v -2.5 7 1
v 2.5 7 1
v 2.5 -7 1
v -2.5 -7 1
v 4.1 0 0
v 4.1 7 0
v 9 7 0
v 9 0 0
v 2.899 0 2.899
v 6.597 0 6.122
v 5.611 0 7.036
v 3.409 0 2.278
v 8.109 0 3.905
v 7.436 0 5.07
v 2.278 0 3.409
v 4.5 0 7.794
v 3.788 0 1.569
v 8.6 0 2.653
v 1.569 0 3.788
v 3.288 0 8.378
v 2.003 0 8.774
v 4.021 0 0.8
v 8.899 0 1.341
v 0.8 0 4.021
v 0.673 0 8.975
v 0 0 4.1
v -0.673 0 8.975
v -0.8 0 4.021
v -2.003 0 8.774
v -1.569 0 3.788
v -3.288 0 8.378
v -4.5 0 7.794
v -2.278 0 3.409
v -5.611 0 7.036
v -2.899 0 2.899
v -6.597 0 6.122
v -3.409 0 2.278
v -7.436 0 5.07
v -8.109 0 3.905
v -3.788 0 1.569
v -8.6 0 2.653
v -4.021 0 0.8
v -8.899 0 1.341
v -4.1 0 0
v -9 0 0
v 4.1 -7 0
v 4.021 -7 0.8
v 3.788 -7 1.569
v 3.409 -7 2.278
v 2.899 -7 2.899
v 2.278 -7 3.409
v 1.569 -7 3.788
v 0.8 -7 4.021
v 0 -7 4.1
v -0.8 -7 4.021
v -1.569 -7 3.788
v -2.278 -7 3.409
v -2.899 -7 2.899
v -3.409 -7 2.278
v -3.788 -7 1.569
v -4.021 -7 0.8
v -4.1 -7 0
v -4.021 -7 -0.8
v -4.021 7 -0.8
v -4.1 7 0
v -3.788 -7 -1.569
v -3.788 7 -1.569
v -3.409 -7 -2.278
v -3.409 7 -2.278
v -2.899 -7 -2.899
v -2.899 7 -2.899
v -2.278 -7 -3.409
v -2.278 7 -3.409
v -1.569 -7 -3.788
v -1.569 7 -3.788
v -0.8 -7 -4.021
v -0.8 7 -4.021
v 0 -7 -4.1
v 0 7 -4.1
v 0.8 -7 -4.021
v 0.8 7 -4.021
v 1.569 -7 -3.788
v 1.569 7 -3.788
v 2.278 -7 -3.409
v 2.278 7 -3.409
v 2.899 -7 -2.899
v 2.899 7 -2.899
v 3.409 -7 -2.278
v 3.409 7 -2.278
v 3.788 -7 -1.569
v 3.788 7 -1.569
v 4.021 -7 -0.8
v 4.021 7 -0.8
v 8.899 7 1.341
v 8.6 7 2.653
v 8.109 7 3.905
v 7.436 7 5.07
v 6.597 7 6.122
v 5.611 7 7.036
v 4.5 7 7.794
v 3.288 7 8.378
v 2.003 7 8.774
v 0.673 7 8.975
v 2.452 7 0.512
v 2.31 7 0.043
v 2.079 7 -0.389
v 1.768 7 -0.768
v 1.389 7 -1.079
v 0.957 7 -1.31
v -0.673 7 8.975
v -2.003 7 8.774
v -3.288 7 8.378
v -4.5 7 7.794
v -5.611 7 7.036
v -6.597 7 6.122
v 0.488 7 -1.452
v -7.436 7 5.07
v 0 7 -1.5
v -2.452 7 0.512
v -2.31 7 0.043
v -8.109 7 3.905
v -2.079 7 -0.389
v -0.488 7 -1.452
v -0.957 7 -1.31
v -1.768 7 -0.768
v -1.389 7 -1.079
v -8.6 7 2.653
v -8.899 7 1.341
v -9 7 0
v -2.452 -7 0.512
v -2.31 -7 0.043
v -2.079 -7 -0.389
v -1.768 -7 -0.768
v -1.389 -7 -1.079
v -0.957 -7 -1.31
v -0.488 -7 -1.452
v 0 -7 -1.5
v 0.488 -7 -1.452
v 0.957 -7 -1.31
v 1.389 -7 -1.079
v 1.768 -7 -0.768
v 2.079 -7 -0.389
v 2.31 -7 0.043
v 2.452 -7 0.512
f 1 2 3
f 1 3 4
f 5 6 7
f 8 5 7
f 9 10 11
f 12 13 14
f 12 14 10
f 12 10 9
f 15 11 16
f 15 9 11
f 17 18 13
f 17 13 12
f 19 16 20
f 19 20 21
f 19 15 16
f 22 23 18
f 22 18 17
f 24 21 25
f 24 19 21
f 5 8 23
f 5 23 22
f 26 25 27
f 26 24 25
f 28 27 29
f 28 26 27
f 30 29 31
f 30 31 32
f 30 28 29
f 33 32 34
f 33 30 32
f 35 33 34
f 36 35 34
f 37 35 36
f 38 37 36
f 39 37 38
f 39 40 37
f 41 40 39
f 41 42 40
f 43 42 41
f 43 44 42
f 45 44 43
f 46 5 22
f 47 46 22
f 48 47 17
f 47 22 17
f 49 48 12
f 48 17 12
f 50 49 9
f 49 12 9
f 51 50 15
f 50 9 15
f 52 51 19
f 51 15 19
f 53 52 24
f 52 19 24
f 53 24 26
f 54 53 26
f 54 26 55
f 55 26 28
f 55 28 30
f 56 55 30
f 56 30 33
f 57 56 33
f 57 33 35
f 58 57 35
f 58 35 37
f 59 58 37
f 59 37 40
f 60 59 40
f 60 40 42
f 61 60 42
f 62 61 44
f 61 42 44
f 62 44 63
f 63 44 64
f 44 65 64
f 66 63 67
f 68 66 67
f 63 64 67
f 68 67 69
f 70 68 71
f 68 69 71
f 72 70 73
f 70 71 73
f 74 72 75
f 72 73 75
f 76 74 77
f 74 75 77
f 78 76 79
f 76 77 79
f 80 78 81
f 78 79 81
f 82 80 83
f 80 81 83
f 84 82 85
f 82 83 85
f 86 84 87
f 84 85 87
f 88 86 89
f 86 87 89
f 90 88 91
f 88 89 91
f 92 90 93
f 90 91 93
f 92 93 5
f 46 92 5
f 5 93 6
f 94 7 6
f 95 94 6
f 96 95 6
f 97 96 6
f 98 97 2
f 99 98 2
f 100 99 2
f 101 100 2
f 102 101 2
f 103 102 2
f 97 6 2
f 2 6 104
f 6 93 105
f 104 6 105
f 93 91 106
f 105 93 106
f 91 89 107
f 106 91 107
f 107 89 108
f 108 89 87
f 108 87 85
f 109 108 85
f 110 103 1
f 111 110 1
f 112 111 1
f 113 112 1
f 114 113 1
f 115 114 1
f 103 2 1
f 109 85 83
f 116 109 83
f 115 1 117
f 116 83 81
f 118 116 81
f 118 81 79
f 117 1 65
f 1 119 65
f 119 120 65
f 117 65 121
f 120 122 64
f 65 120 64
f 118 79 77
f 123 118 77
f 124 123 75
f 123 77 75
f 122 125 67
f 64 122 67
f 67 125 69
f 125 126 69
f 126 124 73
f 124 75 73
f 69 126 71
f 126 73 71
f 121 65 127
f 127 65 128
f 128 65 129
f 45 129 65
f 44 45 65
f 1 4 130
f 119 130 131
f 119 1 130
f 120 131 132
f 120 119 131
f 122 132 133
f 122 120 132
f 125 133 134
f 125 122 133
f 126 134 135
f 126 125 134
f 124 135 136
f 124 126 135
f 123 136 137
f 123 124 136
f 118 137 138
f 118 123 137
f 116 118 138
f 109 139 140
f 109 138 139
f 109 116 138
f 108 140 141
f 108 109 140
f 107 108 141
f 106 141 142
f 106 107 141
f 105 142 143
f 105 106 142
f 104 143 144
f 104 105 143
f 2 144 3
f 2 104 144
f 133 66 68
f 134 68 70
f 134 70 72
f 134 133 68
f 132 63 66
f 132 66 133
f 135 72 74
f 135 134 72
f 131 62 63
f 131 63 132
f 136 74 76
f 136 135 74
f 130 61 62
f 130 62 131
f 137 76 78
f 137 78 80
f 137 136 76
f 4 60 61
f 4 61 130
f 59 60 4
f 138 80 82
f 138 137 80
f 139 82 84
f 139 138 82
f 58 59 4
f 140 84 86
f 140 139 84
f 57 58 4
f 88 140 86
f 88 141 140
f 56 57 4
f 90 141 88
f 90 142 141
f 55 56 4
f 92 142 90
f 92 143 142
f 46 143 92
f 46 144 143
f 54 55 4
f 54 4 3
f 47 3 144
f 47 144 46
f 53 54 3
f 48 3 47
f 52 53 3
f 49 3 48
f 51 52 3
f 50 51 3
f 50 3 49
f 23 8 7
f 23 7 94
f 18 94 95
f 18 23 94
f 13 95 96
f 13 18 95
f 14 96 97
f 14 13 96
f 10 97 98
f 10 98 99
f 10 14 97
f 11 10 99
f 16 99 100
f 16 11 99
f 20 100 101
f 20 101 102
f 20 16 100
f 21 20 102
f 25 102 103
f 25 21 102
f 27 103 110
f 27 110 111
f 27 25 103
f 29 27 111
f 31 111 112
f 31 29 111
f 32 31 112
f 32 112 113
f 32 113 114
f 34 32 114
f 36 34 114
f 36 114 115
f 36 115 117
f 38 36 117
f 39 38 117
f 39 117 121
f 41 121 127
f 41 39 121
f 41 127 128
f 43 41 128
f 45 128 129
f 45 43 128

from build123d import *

# Parameters (mm, degrees)
BOSS_EXTRUDE1_DEPTH = 7
SKETCH2_R           = 4.1
BOSS_EXTRUDE2_DEPTH = 7
CUT_EXTRUDE1_DEPTH  = 15


with BuildPart() as part:
    # Sketch1 → Boss-Extrude1 (new body)
    with BuildSketch(Plane(origin=(0, 0, 0), x_dir=(1, 0, 0), z_dir=(0, 1, 0))):
        with BuildLine():
            Line((4.1, 0), (9, 0))
            ThreePointArc((9, 0), (0, -9), (-9, 0))
            Line((-9, 0), (-4.1, 0))
            ThreePointArc((-4.1, 0), (0, 4.1), (4.1, 0))
        make_face()
    extrude(amount=BOSS_EXTRUDE1_DEPTH)

    # Sketch2 → Boss-Extrude2 (add)
    with BuildSketch(Plane.XZ):
        Circle(SKETCH2_R)
    extrude(amount=BOSS_EXTRUDE2_DEPTH)

    # Sketch3 → Cut-Extrude1 (cut, through all)
    with BuildSketch(Plane(origin=(0, 7, 0), x_dir=(1, 0, 0), z_dir=(0, 1, 0))):
        with BuildLine():
            Line((2.5, -1), (-2.5, -1))
            ThreePointArc((-2.5, -1), (0, 1.5), (2.5, -1))
        make_face()
    extrude(amount=-CUT_EXTRUDE1_DEPTH, mode=Mode.SUBTRACT)


solid = part.part
